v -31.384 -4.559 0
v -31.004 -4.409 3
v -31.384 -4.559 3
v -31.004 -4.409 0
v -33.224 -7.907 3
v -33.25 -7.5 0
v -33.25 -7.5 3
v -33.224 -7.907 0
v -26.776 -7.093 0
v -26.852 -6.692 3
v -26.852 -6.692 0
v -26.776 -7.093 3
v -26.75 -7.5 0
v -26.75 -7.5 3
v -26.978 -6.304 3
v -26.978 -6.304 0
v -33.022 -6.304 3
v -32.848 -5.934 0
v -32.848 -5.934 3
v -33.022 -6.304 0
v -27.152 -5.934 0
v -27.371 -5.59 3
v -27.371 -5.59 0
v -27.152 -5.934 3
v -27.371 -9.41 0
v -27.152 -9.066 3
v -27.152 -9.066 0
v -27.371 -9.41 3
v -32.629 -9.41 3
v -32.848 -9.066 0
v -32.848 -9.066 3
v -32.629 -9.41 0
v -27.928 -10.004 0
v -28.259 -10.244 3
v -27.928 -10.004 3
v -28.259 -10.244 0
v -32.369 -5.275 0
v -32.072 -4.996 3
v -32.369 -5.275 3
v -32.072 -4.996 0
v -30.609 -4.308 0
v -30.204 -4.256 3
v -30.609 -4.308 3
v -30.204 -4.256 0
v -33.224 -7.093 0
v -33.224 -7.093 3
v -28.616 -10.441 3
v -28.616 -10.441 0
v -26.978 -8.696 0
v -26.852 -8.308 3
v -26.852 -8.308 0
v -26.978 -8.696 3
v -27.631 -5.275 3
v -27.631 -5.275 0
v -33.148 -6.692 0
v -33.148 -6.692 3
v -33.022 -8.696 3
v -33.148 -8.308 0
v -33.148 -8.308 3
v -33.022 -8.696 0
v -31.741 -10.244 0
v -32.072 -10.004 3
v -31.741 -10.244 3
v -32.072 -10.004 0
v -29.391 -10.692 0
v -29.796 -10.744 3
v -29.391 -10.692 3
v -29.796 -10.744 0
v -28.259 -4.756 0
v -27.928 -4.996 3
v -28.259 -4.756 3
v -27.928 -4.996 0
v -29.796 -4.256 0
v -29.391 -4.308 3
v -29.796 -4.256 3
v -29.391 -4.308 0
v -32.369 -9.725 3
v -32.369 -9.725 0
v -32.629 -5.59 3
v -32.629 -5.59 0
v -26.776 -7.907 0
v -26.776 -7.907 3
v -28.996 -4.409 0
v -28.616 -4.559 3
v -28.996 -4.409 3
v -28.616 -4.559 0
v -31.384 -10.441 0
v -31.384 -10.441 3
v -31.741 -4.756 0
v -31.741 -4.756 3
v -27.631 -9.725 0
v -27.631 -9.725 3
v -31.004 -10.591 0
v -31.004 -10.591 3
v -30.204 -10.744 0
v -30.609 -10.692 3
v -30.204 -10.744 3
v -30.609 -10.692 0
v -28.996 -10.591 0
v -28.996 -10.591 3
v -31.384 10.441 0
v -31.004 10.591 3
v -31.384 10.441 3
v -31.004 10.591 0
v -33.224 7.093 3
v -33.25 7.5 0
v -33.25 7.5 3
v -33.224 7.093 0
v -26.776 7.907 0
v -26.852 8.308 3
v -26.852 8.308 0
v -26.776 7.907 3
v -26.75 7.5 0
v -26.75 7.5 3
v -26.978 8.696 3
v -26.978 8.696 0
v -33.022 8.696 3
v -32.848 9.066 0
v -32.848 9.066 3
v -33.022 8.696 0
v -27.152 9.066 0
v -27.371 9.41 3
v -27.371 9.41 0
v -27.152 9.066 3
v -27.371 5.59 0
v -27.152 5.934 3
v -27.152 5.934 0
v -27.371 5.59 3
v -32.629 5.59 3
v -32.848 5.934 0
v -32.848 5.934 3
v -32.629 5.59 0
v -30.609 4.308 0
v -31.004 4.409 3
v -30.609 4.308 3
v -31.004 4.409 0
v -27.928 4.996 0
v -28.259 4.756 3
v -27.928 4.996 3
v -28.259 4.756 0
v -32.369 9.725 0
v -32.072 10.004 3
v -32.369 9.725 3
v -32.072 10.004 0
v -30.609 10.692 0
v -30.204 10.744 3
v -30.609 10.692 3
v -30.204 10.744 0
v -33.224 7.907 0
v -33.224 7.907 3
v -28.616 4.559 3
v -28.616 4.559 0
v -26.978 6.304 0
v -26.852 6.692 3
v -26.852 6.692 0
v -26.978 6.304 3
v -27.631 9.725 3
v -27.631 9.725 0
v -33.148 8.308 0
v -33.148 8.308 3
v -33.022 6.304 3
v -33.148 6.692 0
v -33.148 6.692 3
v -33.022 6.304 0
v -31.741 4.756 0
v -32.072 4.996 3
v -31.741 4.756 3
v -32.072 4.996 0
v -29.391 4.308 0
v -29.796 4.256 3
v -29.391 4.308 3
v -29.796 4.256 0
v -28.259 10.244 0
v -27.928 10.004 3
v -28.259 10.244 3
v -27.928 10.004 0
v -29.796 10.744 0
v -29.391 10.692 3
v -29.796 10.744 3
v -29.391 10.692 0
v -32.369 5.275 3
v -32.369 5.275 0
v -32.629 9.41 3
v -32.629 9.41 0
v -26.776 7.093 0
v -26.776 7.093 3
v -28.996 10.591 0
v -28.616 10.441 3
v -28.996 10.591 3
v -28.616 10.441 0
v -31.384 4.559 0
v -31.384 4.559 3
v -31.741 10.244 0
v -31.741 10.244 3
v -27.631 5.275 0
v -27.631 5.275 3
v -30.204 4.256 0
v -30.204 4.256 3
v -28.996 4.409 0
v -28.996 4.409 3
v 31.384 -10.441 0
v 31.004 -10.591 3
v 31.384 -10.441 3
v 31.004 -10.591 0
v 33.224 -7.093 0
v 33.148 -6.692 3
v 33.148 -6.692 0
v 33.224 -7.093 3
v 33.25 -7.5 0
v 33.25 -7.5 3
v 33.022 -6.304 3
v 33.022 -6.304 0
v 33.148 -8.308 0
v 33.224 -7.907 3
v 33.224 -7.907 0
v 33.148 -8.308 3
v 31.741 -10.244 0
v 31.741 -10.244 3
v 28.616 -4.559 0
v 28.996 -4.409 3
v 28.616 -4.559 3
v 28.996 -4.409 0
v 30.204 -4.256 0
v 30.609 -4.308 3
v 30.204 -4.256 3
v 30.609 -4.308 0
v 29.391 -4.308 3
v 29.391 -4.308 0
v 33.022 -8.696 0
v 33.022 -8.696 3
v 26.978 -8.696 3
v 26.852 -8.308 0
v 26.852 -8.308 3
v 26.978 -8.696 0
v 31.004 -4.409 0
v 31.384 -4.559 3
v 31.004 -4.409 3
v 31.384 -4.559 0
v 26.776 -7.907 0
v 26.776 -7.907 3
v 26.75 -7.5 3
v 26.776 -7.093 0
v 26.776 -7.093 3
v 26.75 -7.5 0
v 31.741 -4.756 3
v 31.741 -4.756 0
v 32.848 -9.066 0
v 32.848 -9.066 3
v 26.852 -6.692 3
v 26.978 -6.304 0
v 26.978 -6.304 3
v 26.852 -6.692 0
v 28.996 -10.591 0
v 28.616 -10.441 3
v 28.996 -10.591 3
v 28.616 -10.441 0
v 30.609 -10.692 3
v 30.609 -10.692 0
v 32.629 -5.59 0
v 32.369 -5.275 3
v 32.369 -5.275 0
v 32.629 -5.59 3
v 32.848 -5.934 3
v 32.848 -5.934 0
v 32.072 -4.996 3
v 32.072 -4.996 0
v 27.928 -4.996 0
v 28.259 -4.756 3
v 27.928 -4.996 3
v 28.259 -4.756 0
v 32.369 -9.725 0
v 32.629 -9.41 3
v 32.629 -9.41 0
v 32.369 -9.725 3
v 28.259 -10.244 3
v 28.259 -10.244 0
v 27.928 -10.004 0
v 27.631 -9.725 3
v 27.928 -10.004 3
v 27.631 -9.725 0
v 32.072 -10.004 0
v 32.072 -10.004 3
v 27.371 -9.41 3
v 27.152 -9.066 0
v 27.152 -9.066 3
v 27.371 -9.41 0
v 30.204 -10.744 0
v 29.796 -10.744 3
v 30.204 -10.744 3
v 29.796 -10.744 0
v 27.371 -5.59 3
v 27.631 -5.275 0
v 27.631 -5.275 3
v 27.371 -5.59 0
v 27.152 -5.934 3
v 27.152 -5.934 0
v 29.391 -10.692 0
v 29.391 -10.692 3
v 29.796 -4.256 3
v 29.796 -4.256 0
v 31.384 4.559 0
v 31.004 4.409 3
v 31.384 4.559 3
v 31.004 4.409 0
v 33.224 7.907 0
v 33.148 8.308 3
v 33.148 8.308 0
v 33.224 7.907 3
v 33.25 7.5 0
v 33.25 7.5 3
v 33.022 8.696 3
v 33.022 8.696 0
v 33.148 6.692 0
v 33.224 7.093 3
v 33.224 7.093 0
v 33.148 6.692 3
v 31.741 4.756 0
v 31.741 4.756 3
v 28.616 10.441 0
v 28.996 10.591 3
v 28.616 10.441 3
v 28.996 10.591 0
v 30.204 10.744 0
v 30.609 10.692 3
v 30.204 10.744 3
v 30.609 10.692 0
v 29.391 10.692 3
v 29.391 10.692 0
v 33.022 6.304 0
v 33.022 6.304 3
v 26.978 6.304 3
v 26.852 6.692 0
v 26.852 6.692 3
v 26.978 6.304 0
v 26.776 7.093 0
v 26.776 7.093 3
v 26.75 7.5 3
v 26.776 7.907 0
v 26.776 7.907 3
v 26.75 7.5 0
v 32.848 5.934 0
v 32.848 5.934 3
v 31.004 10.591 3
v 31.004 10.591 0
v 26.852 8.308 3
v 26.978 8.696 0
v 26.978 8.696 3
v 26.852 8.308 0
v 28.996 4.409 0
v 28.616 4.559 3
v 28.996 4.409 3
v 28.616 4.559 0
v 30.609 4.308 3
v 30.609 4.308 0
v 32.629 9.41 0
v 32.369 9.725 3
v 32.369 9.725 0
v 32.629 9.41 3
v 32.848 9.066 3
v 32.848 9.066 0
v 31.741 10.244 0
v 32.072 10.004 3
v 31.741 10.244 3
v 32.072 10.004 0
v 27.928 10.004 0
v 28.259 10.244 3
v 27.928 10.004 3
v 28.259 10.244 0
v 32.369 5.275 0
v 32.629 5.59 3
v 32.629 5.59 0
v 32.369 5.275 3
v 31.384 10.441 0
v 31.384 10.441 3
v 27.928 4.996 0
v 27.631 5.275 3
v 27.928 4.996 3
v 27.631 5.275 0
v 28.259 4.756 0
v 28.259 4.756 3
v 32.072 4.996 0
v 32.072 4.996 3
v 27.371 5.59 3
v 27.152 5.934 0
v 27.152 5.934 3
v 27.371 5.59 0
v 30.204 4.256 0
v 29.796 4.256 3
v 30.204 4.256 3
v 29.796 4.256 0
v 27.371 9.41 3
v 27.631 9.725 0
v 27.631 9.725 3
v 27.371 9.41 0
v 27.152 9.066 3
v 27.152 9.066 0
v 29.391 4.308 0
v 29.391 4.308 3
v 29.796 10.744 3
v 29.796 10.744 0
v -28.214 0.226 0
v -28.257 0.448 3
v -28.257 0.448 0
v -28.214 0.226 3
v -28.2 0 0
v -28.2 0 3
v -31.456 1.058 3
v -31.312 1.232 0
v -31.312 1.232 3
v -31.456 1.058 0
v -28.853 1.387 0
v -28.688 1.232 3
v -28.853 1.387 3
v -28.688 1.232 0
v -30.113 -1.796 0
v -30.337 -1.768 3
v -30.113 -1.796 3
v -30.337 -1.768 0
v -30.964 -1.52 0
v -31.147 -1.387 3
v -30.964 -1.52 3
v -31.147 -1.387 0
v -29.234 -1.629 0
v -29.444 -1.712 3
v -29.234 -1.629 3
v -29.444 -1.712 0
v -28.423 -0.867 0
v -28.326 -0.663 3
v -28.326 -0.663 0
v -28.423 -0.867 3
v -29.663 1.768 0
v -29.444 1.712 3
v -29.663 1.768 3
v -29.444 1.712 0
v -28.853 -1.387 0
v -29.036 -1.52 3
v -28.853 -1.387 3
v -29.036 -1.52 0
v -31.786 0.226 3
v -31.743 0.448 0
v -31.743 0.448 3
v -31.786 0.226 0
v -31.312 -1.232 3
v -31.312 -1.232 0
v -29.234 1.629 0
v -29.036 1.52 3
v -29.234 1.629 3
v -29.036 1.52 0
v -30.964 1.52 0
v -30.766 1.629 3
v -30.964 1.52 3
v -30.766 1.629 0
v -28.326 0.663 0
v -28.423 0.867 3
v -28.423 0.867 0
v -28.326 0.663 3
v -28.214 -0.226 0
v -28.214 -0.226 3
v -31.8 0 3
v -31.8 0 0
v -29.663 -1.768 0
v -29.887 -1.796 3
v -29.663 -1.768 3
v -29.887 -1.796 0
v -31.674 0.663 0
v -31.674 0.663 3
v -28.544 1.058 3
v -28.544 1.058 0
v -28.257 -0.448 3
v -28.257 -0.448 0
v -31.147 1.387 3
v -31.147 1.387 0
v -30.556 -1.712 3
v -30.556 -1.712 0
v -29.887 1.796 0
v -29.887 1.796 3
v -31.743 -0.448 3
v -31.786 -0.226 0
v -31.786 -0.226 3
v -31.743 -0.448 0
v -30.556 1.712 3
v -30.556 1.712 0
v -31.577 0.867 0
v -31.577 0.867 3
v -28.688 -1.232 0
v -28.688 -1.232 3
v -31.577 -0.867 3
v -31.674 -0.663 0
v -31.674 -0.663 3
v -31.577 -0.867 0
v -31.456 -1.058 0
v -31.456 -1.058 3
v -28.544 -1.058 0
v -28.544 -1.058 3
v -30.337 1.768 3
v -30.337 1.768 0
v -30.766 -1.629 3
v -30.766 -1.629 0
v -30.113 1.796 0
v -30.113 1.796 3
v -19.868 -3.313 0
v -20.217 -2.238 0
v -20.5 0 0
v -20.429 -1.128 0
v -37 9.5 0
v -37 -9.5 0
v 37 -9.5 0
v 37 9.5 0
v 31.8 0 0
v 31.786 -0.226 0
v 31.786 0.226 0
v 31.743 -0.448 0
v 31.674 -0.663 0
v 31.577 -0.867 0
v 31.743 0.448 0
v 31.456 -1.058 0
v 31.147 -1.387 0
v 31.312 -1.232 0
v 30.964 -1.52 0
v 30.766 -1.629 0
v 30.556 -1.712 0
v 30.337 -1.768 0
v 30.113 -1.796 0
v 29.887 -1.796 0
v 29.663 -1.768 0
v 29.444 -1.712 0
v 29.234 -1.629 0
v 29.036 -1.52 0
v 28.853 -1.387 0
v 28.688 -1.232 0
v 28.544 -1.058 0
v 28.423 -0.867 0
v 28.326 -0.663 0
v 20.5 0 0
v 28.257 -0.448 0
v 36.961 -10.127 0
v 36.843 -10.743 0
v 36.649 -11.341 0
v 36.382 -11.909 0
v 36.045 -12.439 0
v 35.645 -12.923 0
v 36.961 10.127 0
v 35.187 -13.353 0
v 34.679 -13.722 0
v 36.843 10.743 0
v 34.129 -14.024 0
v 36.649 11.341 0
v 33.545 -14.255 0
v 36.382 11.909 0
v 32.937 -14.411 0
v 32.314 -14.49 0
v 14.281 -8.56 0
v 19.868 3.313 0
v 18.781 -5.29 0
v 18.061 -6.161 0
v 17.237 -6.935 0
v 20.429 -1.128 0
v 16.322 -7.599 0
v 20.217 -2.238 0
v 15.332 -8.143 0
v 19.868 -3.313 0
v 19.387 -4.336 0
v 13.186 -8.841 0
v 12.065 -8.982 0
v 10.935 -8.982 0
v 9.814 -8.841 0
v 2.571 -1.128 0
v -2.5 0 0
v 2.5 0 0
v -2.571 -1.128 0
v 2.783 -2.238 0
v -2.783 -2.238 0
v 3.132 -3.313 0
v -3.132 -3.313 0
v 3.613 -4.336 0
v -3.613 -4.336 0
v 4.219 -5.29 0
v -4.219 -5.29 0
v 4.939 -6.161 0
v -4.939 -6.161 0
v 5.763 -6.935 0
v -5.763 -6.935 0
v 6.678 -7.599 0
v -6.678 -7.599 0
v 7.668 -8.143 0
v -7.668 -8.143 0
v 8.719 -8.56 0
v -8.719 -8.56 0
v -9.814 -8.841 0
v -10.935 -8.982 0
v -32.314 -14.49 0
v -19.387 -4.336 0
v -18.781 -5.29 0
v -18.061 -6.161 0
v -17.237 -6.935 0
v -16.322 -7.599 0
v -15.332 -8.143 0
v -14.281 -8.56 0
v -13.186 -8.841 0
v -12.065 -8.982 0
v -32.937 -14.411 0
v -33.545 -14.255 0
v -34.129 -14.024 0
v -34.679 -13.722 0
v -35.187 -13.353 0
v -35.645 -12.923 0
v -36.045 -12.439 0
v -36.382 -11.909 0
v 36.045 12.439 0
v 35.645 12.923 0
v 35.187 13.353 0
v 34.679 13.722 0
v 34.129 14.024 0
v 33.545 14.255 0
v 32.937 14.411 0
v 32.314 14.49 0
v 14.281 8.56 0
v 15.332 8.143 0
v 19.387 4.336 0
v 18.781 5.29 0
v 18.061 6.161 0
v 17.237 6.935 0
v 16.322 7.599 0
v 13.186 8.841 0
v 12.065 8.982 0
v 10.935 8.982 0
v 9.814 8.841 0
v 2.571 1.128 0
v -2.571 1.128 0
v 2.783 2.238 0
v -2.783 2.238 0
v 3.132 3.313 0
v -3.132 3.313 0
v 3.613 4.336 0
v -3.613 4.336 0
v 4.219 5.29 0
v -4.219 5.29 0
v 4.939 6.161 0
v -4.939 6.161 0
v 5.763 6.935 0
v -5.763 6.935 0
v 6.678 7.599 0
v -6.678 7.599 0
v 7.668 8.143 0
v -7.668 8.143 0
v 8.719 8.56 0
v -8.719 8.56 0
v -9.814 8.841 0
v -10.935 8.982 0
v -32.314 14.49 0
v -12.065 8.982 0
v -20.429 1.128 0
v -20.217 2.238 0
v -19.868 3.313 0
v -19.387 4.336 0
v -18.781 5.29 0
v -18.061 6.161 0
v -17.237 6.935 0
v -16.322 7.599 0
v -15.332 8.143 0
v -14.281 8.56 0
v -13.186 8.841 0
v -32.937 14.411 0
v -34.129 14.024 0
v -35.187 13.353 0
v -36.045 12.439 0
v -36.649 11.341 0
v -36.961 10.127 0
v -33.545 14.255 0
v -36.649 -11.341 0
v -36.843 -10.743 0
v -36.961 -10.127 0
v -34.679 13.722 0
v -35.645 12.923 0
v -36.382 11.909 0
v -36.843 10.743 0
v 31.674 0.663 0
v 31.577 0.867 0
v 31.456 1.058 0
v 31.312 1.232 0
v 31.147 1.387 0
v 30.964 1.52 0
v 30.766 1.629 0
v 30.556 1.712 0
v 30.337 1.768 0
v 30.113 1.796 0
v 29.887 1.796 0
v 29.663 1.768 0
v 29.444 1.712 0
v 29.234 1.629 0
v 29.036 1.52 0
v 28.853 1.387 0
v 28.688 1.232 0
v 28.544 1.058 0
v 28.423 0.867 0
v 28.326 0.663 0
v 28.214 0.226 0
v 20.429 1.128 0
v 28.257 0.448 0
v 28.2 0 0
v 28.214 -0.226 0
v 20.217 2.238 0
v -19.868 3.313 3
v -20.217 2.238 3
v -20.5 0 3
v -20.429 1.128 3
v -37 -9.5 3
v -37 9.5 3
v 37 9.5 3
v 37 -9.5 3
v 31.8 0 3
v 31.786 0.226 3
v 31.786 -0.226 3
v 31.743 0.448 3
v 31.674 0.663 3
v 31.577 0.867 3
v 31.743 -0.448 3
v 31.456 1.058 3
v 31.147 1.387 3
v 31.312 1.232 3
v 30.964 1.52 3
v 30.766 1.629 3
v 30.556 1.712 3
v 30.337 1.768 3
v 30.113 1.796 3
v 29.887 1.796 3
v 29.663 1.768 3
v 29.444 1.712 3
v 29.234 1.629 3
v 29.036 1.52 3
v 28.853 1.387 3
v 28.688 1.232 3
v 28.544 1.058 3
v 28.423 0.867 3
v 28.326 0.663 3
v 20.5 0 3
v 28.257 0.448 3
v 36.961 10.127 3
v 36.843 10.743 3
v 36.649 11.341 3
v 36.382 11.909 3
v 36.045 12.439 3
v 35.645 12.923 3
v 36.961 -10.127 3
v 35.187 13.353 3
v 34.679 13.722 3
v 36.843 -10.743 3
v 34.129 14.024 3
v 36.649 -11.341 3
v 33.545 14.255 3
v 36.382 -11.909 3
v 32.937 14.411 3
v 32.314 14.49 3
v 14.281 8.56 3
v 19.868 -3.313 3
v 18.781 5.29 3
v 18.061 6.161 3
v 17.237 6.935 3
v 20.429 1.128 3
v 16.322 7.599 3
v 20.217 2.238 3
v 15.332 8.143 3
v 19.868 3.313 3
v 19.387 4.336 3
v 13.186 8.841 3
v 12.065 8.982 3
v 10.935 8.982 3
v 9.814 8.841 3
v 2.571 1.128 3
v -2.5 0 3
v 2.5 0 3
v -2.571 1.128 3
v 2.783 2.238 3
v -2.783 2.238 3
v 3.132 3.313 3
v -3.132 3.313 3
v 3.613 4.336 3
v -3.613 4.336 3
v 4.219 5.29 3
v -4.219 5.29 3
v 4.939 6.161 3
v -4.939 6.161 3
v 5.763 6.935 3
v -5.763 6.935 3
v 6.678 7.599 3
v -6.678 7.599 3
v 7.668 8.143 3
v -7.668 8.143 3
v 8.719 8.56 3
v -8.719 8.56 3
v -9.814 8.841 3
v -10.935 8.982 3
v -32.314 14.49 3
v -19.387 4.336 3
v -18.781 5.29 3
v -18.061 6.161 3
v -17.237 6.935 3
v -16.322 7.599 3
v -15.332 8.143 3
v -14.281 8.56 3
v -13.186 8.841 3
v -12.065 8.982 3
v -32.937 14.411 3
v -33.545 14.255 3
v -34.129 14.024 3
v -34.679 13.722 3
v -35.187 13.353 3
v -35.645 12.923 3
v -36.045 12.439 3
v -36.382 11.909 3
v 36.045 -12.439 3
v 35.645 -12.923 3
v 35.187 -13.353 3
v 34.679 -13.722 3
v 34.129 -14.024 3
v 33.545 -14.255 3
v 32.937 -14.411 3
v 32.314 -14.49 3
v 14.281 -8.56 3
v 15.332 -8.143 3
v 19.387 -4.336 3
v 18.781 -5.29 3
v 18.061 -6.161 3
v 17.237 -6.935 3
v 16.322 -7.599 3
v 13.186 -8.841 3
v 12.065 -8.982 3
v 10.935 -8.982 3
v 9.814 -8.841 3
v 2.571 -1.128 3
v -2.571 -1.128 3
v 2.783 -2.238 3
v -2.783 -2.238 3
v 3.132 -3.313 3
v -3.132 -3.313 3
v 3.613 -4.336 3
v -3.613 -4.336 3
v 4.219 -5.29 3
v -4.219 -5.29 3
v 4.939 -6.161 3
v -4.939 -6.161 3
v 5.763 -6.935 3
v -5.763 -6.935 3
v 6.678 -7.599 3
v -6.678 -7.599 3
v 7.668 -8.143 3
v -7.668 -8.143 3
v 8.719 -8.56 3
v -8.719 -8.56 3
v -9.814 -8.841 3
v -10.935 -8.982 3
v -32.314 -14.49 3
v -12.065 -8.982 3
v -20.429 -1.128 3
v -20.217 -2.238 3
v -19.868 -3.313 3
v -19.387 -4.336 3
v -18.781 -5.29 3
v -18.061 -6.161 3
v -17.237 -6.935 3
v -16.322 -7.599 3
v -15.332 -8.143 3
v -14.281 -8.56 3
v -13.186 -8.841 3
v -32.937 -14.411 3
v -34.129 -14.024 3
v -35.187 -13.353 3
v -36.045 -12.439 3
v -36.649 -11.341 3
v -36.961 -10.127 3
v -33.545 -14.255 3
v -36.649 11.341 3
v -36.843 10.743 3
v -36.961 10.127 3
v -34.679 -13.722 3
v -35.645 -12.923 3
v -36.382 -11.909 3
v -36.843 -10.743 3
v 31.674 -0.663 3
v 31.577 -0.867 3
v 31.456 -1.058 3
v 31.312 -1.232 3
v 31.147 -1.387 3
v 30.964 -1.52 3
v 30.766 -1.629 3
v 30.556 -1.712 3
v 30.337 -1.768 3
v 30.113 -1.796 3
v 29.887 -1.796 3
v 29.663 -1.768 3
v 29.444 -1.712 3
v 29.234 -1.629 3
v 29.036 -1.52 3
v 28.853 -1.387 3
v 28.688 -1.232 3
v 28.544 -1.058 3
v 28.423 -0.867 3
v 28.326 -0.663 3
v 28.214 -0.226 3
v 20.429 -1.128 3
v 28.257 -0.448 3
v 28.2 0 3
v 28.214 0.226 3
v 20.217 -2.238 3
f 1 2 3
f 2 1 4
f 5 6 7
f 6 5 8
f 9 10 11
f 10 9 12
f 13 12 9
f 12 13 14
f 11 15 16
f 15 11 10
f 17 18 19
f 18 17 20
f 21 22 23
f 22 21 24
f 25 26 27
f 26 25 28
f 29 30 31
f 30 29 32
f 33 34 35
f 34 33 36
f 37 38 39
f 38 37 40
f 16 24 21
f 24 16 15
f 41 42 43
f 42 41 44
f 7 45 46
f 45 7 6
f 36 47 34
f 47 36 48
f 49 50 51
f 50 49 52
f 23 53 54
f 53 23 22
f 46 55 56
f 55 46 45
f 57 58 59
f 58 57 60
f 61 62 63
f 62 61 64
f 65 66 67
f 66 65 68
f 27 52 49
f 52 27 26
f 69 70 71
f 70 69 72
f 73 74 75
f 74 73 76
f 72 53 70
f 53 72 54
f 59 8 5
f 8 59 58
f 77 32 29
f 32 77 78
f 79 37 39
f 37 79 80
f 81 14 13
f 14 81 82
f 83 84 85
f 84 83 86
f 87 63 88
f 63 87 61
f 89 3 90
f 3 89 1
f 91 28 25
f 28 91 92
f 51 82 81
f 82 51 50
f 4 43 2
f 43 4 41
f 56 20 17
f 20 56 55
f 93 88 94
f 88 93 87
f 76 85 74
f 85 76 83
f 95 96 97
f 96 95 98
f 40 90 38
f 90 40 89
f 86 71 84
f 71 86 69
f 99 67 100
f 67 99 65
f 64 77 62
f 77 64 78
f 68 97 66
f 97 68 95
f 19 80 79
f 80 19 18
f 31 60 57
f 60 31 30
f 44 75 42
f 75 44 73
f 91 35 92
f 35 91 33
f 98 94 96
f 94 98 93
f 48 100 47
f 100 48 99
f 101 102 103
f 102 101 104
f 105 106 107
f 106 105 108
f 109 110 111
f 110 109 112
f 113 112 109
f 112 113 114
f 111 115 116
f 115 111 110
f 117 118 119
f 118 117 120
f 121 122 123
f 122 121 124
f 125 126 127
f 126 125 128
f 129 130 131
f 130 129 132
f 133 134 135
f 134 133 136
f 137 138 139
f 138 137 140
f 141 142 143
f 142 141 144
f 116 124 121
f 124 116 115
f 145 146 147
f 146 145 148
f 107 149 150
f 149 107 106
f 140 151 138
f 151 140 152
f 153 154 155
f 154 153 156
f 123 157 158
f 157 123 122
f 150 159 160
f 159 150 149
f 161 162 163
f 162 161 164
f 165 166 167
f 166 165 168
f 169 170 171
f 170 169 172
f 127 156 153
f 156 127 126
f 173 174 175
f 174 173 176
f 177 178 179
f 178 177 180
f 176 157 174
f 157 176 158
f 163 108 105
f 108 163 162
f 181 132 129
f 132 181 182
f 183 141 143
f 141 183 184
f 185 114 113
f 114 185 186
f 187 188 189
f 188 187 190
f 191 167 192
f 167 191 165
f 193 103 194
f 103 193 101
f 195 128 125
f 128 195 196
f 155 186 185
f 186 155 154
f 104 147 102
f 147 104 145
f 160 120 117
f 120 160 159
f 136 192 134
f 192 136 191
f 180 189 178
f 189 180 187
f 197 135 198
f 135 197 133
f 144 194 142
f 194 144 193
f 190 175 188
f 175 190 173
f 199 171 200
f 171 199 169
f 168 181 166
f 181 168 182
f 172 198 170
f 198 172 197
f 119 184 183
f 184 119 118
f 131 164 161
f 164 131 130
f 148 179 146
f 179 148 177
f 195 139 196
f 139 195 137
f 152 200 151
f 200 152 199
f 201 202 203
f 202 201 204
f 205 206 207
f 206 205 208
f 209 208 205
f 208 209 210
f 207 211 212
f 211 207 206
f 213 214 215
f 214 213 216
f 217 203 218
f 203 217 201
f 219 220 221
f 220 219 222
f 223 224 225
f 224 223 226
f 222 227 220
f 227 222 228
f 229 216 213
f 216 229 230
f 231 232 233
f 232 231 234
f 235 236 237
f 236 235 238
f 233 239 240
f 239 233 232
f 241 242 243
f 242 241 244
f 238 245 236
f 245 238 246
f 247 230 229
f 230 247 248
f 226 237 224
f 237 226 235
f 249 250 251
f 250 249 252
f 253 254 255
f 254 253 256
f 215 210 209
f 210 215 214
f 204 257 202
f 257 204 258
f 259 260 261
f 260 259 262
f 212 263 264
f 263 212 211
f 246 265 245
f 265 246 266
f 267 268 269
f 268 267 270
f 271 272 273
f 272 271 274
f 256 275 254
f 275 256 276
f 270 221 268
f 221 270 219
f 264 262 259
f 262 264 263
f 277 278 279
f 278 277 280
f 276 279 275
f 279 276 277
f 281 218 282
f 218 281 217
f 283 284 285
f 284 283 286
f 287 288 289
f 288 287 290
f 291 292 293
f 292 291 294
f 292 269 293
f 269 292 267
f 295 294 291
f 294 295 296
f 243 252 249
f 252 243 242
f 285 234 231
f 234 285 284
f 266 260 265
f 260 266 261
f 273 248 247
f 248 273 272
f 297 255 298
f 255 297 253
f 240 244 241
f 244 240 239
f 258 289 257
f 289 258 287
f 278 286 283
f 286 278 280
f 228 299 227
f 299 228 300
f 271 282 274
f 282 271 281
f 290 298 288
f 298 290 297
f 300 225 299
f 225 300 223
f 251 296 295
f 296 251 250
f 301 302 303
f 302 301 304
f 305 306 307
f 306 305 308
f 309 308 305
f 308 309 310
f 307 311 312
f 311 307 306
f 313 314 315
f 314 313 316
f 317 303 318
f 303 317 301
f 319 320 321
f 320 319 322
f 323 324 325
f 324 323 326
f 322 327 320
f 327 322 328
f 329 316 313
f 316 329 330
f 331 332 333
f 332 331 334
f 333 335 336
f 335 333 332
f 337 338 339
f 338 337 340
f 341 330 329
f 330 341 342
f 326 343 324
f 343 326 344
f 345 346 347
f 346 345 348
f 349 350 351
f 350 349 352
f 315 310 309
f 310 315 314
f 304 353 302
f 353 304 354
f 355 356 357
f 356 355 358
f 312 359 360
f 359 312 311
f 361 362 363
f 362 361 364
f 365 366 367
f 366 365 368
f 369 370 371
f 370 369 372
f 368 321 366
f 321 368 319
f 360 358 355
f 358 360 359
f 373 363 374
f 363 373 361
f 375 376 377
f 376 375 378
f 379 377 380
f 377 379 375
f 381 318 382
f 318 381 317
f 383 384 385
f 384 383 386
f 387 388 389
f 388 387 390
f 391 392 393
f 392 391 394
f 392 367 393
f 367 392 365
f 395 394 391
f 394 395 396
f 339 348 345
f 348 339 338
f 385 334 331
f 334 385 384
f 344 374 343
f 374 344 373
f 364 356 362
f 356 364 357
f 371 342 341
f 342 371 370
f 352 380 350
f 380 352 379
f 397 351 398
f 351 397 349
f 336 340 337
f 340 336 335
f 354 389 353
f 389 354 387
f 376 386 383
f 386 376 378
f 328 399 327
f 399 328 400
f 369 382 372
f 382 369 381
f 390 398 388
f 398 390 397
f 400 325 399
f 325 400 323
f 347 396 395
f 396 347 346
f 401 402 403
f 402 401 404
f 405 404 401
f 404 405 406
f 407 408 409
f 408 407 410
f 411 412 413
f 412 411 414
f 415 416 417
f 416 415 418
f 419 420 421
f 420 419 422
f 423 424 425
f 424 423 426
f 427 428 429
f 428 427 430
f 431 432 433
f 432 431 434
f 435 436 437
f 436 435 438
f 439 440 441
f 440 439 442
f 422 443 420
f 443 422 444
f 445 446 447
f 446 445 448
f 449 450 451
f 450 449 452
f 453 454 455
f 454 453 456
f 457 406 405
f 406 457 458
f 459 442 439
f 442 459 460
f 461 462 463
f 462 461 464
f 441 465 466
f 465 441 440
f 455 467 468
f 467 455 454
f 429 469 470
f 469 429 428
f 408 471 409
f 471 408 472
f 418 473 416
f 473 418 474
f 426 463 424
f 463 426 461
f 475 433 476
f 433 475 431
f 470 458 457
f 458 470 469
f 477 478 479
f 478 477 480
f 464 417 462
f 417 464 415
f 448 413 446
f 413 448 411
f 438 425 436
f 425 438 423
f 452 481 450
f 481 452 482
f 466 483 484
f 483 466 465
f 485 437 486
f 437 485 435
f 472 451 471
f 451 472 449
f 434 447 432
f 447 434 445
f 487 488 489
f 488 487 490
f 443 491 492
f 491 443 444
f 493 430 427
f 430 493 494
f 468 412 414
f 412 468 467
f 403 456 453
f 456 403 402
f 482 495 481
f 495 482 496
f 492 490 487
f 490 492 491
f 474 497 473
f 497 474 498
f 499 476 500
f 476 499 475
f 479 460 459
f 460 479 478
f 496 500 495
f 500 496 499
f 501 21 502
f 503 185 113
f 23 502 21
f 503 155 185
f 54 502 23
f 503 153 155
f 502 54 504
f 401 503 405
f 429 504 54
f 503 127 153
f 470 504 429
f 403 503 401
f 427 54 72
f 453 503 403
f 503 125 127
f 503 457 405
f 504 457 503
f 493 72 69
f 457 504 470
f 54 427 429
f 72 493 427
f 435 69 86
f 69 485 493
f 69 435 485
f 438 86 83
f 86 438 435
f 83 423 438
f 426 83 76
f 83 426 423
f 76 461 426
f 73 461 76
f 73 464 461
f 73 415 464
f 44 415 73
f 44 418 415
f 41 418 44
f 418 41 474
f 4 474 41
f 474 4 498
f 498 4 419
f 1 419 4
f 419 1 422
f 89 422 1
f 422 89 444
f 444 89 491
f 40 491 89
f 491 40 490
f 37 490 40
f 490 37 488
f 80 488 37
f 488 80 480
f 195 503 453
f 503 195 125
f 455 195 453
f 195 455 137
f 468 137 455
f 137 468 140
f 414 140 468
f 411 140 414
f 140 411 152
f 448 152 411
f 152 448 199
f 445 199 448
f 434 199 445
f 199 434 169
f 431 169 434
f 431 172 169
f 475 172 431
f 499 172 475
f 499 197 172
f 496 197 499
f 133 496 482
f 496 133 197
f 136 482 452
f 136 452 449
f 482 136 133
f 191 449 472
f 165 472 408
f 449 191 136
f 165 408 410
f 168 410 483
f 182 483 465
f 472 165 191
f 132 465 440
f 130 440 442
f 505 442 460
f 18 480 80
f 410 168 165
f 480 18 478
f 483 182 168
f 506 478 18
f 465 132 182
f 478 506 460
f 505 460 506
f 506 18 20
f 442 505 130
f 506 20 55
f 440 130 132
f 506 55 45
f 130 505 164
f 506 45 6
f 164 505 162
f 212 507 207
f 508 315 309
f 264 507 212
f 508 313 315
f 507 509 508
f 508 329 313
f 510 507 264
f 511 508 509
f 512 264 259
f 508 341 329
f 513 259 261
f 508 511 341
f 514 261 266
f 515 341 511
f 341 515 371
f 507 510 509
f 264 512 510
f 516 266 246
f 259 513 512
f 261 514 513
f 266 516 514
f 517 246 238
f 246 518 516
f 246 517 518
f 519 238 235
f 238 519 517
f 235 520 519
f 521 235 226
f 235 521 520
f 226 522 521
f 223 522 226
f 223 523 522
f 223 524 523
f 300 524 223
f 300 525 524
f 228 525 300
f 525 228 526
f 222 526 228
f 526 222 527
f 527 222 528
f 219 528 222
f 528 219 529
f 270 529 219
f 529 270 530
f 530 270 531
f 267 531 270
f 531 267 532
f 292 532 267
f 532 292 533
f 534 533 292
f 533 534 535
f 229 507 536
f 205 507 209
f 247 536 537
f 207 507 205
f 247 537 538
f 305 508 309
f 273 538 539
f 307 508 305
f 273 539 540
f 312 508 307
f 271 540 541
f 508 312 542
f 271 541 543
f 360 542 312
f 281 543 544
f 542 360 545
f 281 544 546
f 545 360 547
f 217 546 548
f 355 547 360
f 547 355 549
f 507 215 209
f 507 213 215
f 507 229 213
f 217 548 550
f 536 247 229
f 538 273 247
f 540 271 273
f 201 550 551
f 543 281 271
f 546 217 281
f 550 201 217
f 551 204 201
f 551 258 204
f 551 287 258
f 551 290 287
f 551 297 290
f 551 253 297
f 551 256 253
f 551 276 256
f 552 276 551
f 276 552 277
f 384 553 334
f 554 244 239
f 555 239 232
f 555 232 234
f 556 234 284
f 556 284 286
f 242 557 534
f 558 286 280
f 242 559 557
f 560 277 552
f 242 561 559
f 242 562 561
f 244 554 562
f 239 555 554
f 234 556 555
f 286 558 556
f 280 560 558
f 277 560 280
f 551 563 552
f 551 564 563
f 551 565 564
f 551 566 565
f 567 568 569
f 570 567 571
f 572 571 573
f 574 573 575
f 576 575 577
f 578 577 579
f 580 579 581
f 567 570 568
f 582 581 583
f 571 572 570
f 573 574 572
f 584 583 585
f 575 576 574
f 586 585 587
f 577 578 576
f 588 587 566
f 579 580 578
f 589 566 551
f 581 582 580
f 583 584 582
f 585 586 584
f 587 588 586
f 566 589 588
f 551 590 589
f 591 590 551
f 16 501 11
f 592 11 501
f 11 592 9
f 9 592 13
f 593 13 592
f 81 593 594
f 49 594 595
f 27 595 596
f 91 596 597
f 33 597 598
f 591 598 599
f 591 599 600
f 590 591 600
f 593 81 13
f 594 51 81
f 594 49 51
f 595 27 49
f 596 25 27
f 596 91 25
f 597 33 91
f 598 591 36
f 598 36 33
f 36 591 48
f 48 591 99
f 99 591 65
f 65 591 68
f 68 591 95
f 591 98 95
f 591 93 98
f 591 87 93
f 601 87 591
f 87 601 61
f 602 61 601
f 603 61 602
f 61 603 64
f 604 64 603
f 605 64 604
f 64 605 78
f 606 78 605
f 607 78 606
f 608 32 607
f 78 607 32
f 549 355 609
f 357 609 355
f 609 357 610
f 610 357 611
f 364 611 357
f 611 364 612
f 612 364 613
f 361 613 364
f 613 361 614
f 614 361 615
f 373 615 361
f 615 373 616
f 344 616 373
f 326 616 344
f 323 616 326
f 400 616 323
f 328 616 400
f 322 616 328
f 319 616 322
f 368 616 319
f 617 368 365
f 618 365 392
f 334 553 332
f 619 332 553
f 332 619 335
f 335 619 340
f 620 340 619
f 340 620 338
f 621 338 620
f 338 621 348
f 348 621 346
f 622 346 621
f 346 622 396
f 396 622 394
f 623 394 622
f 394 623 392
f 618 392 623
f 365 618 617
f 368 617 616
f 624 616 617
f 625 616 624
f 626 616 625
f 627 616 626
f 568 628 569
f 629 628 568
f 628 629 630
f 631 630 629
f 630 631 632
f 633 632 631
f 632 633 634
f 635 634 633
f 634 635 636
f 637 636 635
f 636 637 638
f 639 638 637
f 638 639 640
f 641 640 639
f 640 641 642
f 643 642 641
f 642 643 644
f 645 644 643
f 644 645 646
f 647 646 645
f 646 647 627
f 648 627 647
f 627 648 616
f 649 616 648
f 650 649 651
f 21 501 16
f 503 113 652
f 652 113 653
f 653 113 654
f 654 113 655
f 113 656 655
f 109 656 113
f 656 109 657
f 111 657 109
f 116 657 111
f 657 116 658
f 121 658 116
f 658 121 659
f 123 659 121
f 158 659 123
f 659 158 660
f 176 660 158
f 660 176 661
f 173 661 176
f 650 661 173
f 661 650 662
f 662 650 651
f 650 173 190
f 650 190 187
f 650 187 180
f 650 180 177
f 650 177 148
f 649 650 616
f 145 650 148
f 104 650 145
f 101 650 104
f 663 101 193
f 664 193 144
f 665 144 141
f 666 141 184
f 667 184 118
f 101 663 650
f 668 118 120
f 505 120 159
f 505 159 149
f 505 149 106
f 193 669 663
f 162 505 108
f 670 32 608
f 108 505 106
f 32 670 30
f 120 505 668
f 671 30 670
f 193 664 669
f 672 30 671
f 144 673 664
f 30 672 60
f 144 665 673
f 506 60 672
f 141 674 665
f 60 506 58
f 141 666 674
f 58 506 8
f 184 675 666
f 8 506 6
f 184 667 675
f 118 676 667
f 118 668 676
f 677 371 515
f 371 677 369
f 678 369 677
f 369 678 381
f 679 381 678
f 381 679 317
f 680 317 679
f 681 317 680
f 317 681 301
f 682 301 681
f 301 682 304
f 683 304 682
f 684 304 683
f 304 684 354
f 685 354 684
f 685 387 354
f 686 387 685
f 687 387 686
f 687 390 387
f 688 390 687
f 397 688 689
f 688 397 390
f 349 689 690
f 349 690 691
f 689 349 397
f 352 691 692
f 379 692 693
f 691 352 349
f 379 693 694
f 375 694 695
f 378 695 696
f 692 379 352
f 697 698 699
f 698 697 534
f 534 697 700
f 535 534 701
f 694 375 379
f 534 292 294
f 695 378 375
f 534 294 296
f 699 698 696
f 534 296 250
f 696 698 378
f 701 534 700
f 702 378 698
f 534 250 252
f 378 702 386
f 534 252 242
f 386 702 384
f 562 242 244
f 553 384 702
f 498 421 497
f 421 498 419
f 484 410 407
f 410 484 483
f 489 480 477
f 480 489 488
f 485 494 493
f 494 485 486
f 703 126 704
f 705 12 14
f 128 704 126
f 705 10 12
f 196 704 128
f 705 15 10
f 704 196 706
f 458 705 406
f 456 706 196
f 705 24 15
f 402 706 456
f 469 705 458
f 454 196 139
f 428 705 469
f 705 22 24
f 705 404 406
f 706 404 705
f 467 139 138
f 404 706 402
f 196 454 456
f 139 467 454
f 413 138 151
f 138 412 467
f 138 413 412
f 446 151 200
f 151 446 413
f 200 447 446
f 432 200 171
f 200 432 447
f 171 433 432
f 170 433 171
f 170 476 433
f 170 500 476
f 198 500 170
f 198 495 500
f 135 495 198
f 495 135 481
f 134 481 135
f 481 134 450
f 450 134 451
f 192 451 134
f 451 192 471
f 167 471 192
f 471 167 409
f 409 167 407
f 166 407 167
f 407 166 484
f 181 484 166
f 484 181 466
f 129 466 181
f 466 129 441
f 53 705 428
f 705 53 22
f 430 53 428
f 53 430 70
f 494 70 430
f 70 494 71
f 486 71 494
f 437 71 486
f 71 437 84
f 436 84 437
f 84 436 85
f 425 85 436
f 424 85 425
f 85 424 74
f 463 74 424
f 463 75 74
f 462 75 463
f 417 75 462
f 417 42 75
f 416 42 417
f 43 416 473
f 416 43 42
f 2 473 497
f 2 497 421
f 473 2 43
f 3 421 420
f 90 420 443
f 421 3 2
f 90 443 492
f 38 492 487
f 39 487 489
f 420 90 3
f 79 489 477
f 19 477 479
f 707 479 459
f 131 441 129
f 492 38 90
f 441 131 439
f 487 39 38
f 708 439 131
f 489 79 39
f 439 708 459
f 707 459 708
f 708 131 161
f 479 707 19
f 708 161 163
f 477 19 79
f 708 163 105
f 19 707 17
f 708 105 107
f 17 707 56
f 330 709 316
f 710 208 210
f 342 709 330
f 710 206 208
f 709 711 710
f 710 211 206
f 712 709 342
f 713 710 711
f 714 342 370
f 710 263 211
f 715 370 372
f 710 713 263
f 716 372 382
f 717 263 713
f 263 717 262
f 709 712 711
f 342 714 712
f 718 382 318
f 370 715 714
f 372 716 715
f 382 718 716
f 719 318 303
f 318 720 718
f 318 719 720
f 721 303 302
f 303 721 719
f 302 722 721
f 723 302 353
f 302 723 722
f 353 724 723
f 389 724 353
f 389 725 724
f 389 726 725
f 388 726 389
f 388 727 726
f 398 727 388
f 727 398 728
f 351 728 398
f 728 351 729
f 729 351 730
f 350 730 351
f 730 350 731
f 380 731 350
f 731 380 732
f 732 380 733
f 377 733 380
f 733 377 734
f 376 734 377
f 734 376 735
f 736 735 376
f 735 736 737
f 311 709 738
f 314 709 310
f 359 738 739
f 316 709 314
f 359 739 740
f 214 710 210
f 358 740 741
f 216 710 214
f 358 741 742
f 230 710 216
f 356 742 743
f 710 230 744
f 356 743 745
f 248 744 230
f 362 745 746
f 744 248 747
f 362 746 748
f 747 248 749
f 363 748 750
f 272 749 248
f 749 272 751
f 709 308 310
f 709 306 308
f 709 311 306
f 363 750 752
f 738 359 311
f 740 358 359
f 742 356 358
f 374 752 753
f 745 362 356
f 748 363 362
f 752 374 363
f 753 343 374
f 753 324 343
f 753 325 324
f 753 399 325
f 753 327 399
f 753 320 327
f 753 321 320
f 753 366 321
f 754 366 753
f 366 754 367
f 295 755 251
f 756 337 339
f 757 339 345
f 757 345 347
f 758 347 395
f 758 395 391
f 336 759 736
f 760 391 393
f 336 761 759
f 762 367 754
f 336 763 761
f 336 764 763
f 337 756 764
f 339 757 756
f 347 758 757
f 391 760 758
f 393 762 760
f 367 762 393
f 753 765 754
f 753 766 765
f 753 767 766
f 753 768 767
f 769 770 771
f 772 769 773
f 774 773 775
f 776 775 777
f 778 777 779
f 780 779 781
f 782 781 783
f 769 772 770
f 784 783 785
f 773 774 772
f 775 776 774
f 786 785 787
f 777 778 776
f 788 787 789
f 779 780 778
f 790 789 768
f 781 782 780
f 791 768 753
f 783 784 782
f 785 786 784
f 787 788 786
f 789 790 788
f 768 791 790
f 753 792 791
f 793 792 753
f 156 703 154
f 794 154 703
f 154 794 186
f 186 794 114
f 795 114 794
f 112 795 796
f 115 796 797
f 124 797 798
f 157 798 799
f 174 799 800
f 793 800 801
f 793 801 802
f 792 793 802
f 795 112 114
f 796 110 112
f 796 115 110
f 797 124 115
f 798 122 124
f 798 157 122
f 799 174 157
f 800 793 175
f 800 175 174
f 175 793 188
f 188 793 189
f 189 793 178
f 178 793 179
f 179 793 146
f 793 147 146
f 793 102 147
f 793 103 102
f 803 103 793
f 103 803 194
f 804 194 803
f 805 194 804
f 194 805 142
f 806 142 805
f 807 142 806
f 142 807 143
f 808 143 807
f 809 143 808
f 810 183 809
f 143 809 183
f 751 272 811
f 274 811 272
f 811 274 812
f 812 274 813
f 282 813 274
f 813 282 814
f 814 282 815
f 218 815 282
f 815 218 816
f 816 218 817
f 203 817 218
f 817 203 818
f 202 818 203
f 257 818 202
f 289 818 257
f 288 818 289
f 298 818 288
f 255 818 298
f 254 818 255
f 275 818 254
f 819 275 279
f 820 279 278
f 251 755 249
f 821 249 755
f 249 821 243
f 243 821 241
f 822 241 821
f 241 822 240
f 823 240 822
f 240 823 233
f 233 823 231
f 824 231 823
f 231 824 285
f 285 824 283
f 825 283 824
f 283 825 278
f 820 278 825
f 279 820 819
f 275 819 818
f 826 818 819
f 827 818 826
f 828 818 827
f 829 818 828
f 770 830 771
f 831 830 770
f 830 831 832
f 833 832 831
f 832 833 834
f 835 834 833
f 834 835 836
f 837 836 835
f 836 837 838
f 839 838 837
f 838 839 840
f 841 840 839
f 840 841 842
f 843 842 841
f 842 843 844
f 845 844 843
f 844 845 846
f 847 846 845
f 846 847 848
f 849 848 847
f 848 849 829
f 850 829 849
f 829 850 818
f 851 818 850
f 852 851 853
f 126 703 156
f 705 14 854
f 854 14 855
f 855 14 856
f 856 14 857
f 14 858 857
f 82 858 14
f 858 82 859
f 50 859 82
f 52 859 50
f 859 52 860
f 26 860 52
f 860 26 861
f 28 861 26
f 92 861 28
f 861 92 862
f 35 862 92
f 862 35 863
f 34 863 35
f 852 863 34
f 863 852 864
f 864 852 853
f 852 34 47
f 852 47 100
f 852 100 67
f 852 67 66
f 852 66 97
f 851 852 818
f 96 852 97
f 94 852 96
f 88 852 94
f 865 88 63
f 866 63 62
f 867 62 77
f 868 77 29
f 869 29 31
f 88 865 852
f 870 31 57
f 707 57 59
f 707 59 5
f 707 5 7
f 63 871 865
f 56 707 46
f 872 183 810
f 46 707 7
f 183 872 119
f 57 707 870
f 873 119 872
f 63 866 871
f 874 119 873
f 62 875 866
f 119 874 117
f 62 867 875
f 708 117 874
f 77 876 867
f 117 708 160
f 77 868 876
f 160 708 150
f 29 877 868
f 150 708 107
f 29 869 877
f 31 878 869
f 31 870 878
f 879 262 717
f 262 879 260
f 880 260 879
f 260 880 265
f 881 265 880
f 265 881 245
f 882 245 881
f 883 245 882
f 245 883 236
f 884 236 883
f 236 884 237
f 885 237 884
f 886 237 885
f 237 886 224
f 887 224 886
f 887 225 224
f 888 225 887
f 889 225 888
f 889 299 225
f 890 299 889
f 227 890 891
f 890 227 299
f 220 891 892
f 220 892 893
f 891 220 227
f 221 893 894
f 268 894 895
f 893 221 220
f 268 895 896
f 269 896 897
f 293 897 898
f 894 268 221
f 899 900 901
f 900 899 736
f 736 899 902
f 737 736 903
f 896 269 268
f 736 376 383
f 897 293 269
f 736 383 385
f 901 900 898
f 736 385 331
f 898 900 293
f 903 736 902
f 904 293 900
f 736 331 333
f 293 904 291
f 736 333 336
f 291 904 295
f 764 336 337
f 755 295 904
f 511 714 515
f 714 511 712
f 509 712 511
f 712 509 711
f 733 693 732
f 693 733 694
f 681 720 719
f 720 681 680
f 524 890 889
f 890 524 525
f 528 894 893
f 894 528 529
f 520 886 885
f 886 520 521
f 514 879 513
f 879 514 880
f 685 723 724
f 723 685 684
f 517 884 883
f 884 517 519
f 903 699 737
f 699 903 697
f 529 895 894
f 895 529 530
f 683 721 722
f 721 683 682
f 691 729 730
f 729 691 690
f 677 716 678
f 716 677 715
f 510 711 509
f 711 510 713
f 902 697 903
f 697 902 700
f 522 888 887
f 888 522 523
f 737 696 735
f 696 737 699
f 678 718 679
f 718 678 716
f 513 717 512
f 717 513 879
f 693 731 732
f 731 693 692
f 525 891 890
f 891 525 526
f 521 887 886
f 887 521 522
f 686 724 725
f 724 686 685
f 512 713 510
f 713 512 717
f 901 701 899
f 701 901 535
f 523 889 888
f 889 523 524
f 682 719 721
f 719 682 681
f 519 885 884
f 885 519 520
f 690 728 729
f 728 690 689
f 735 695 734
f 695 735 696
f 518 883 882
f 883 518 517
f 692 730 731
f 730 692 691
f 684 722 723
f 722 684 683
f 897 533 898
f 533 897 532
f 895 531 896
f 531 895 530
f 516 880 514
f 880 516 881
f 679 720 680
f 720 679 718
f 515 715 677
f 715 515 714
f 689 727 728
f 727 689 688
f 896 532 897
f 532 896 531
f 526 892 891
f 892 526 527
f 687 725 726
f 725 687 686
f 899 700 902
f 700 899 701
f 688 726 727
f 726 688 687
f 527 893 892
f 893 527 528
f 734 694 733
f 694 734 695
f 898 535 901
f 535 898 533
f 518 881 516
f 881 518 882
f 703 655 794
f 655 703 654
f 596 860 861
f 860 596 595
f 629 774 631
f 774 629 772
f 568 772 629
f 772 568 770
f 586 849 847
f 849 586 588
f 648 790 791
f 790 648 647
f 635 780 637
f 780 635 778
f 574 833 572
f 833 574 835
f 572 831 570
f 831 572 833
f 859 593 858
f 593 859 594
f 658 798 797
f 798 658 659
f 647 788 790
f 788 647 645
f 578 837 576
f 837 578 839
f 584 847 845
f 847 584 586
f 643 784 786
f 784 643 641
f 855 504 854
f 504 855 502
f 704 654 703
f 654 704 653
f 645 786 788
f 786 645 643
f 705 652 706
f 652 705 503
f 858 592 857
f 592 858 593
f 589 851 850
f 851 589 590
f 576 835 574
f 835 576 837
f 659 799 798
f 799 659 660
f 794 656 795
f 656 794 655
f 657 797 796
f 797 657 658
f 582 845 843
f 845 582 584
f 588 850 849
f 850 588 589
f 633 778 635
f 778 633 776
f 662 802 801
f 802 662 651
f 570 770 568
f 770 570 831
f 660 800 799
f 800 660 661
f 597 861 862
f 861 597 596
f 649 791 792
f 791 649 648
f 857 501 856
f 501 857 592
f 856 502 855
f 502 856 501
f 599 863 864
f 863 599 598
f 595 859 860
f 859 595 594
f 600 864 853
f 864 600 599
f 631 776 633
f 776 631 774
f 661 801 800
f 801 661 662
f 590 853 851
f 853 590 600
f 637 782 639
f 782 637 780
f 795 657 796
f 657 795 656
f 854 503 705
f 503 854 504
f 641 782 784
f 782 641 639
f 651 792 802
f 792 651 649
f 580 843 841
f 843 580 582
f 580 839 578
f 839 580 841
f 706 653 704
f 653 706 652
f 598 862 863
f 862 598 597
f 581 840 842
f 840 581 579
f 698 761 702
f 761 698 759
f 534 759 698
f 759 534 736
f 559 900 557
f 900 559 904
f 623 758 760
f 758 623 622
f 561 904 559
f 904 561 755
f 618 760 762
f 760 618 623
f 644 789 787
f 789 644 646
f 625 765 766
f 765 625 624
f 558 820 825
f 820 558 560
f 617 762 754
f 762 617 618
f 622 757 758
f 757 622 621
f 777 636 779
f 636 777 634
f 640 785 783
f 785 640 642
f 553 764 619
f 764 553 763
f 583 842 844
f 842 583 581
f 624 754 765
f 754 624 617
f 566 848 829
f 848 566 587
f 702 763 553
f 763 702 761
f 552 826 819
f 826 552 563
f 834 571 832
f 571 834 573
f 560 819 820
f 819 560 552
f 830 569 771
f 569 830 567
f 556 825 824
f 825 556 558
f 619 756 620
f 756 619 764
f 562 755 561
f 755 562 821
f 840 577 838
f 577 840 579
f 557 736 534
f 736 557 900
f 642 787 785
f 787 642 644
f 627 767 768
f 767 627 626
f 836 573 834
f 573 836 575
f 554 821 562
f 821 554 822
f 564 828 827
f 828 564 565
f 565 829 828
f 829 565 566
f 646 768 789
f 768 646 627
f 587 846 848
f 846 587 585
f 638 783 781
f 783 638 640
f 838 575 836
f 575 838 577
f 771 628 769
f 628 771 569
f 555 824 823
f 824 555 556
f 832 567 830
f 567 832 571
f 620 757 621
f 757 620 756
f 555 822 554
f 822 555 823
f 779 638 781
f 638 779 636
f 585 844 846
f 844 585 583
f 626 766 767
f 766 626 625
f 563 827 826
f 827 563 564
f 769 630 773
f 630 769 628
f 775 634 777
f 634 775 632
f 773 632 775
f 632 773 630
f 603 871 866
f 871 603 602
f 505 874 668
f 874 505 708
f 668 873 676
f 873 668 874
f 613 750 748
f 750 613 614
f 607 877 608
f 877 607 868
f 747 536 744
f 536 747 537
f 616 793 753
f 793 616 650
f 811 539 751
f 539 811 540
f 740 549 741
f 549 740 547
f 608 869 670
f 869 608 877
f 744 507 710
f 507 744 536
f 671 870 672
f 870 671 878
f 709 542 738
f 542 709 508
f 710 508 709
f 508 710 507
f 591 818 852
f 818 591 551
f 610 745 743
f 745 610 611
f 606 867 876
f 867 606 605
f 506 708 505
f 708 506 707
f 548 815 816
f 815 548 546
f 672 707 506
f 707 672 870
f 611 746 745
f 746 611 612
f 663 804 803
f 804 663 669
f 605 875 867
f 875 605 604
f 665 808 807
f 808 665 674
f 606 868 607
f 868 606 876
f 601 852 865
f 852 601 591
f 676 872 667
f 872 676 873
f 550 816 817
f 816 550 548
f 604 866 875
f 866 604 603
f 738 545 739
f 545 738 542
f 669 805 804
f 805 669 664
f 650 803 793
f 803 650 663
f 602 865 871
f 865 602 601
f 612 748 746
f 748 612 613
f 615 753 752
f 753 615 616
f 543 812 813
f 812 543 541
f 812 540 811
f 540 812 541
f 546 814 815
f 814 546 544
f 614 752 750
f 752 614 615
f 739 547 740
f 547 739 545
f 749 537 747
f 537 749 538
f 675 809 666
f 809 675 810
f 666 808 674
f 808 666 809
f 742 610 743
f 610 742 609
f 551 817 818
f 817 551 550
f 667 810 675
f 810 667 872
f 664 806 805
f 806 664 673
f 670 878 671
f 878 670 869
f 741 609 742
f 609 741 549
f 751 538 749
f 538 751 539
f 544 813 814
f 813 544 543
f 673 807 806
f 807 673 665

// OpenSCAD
$fn = 50;


difference() {
	union() {
		hull() {
			translate(v = [-32.0000000000, 9.5000000000, 0]) {
				cylinder(h = 3, r = 5);
			}
			translate(v = [32.0000000000, 9.5000000000, 0]) {
				cylinder(h = 3, r = 5);
			}
			translate(v = [-32.0000000000, -9.5000000000, 0]) {
				cylinder(h = 3, r = 5);
			}
			translate(v = [32.0000000000, -9.5000000000, 0]) {
				cylinder(h = 3, r = 5);
			}
		}
	}
	union() {
		#translate(v = [-30.0000000000, -7.5000000000, 0]) {
			cylinder(h = 3, r = 3.2500000000);
		}
		#translate(v = [-30.0000000000, 7.5000000000, 0]) {
			cylinder(h = 3, r = 3.2500000000);
		}
		#translate(v = [30.0000000000, -7.5000000000, 0]) {
			cylinder(h = 3, r = 3.2500000000);
		}
		#translate(v = [30.0000000000, 7.5000000000, 0]) {
			cylinder(h = 3, r = 3.2500000000);
		}
		#translate(v = [-30.0000000000, -7.5000000000, -100.0000000000]) {
			cylinder(h = 200, r = 3.2500000000);
		}
		#translate(v = [-30.0000000000, 7.5000000000, -100.0000000000]) {
			cylinder(h = 200, r = 3.2500000000);
		}
		#translate(v = [30.0000000000, -7.5000000000, -100.0000000000]) {
			cylinder(h = 200, r = 3.2500000000);
		}
		#translate(v = [30.0000000000, 7.5000000000, -100.0000000000]) {
			cylinder(h = 200, r = 3.2500000000);
		}
		#translate(v = [-30.0000000000, -7.5000000000, 0]) {
			cylinder(h = 3, r = 1.8000000000);
		}
		#translate(v = [-30.0000000000, 0.0000000000, 0]) {
			cylinder(h = 3, r = 1.8000000000);
		}
		#translate(v = [-30.0000000000, 7.5000000000, 0]) {
			cylinder(h = 3, r = 1.8000000000);
		}
		#translate(v = [30.0000000000, -7.5000000000, 0]) {
			cylinder(h = 3, r = 1.8000000000);
		}
		#translate(v = [30.0000000000, 0.0000000000, 0]) {
			cylinder(h = 3, r = 1.8000000000);
		}
		#translate(v = [30.0000000000, 7.5000000000, 0]) {
			cylinder(h = 3, r = 1.8000000000);
		}
		#translate(v = [-30.0000000000, -7.5000000000, 0]) {
			cylinder(h = 3, r = 1.8000000000);
		}
		#translate(v = [-30.0000000000, 0.0000000000, 0]) {
			cylinder(h = 3, r = 1.8000000000);
		}
		#translate(v = [-30.0000000000, 7.5000000000, 0]) {
			cylinder(h = 3, r = 1.8000000000);
		}
		#translate(v = [30.0000000000, -7.5000000000, 0]) {
			cylinder(h = 3, r = 1.8000000000);
		}
		#translate(v = [30.0000000000, 0.0000000000, 0]) {
			cylinder(h = 3, r = 1.8000000000);
		}
		#translate(v = [30.0000000000, 7.5000000000, 0]) {
			cylinder(h = 3, r = 1.8000000000);
		}
		#translate(v = [-30.0000000000, -7.5000000000, 0]) {
			cylinder(h = 3, r = 1.8000000000);
		}
		#translate(v = [-30.0000000000, 0.0000000000, 0]) {
			cylinder(h = 3, r = 1.8000000000);
		}
		#translate(v = [-30.0000000000, 7.5000000000, 0]) {
			cylinder(h = 3, r = 1.8000000000);
		}
		#translate(v = [30.0000000000, -7.5000000000, 0]) {
			cylinder(h = 3, r = 1.8000000000);
		}
		#translate(v = [30.0000000000, 0.0000000000, 0]) {
			cylinder(h = 3, r = 1.8000000000);
		}
		#translate(v = [30.0000000000, 7.5000000000, 0]) {
			cylinder(h = 3, r = 1.8000000000);
		}
		#translate(v = [-11.5000000000, 0, 0]) {
			cylinder(h = 3, r = 9.0000000000);
		}
		#translate(v = [11.5000000000, 0, 0]) {
			cylinder(h = 3, r = 9.0000000000);
		}
	}
}
